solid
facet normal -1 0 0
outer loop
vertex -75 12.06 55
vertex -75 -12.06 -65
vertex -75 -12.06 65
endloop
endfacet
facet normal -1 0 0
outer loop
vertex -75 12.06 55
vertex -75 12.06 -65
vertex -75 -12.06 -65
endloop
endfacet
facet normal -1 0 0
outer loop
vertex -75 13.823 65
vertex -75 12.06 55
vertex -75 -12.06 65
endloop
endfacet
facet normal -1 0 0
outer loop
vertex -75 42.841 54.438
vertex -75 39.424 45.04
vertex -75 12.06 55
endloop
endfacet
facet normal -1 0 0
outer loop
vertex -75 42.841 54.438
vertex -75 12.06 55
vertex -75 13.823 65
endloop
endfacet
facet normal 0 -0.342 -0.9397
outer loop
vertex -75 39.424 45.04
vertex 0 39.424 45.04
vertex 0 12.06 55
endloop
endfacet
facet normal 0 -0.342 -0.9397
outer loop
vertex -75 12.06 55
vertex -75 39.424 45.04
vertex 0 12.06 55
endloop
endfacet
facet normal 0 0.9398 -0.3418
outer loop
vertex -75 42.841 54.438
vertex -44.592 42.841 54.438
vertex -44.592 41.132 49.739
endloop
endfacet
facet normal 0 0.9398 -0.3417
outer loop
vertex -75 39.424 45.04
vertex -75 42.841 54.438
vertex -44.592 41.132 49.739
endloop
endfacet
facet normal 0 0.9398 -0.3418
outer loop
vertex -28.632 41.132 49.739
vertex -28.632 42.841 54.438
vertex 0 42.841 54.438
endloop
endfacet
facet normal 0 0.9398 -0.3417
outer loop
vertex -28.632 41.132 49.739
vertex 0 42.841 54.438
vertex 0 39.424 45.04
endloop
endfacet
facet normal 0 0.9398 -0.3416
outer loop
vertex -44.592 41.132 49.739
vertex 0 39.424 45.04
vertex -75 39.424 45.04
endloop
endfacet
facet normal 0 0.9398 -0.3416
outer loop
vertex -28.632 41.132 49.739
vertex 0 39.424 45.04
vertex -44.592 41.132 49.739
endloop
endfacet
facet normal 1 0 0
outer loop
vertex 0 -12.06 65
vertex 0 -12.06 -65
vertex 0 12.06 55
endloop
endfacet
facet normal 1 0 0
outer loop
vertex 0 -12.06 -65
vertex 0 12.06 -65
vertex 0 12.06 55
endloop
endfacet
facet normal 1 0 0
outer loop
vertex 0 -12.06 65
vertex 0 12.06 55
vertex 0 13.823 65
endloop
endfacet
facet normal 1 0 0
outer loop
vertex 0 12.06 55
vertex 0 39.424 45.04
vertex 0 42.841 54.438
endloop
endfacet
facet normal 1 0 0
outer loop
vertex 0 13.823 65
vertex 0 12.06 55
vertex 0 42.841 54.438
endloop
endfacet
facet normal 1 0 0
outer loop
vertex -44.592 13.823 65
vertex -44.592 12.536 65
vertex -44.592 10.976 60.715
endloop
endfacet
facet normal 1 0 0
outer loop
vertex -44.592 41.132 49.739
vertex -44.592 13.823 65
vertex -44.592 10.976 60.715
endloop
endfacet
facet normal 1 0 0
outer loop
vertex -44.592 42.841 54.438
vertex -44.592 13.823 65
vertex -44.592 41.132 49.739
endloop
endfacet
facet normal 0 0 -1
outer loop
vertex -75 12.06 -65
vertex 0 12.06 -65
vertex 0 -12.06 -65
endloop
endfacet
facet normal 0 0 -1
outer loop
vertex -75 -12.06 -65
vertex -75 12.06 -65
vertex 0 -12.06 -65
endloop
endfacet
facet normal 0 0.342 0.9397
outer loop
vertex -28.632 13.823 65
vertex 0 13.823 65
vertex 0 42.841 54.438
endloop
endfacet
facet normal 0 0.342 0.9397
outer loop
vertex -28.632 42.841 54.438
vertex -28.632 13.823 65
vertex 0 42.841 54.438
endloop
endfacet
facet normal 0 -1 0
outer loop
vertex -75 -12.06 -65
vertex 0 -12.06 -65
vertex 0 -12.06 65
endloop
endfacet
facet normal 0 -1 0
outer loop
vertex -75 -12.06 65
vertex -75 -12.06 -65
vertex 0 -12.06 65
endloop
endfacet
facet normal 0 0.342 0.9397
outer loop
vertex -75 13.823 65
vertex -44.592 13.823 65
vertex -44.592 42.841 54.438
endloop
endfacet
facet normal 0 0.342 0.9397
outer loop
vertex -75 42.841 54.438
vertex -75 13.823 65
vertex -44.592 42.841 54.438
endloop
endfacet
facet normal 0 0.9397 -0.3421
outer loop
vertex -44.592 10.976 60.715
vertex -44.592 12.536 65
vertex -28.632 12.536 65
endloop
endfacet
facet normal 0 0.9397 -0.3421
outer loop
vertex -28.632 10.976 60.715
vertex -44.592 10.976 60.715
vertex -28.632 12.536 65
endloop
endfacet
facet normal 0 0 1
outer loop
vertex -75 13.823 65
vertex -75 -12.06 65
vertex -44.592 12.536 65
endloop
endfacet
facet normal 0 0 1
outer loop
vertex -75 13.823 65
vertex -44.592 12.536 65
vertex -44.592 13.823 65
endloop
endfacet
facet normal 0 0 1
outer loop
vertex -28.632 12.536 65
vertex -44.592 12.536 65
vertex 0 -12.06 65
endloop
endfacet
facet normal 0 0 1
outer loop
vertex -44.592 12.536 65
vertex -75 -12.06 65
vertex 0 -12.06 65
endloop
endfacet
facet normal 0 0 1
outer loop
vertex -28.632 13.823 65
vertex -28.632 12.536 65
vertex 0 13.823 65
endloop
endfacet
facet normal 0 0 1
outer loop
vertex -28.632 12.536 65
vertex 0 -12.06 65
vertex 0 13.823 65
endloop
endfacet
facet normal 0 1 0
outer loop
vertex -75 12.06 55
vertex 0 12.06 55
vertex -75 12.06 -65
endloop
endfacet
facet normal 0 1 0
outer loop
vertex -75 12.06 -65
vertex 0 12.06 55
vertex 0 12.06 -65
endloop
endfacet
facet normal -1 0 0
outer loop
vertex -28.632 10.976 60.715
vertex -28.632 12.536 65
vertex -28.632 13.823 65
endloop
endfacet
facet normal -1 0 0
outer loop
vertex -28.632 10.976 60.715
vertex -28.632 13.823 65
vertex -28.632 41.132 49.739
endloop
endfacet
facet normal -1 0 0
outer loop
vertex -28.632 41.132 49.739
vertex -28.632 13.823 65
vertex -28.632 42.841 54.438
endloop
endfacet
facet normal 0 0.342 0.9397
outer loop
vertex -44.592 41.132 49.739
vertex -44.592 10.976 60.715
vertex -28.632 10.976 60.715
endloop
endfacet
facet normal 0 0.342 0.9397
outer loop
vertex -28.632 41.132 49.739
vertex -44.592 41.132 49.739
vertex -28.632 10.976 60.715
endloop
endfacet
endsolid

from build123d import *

# Parameters (mm, degrees)
BOSS_EXTRUDE1_DEPTH = 75
SKETCH2_W           = 15.96
SKETCH2_H           = 40
CUT_EXTRUDE1_DEPTH  = 5


with BuildPart() as part:
    # Sketch1 → Boss-Extrude1 (new body)
    with BuildSketch(Plane(origin=(0, 0, 0), x_dir=(0, 0, -1), z_dir=(1, 0, 0))):
        Polygon((65, -12.06), (-65, -12.06), (-65, 13.823269807), (-54.438417974, 42.840977937), (-45.040373426, 39.423849117), (-55, 12.06), (65, 12.06), align=None)
    extrude(amount=-BOSS_EXTRUDE1_DEPTH)

    # Sketch2 → Cut-Extrude1 (cut)
    with BuildSketch(Plane(origin=(0, 22.507612708, 61.83915768), x_dir=(1, 0, 0), z_dir=(0, 0.342020143325673, 0.9396926207859068))):
        with Locations((-36.611821511, 9.548315317)):
            Rectangle(SKETCH2_W, SKETCH2_H)
    extrude(amount=-CUT_EXTRUDE1_DEPTH, mode=Mode.SUBTRACT)


solid = part.part
